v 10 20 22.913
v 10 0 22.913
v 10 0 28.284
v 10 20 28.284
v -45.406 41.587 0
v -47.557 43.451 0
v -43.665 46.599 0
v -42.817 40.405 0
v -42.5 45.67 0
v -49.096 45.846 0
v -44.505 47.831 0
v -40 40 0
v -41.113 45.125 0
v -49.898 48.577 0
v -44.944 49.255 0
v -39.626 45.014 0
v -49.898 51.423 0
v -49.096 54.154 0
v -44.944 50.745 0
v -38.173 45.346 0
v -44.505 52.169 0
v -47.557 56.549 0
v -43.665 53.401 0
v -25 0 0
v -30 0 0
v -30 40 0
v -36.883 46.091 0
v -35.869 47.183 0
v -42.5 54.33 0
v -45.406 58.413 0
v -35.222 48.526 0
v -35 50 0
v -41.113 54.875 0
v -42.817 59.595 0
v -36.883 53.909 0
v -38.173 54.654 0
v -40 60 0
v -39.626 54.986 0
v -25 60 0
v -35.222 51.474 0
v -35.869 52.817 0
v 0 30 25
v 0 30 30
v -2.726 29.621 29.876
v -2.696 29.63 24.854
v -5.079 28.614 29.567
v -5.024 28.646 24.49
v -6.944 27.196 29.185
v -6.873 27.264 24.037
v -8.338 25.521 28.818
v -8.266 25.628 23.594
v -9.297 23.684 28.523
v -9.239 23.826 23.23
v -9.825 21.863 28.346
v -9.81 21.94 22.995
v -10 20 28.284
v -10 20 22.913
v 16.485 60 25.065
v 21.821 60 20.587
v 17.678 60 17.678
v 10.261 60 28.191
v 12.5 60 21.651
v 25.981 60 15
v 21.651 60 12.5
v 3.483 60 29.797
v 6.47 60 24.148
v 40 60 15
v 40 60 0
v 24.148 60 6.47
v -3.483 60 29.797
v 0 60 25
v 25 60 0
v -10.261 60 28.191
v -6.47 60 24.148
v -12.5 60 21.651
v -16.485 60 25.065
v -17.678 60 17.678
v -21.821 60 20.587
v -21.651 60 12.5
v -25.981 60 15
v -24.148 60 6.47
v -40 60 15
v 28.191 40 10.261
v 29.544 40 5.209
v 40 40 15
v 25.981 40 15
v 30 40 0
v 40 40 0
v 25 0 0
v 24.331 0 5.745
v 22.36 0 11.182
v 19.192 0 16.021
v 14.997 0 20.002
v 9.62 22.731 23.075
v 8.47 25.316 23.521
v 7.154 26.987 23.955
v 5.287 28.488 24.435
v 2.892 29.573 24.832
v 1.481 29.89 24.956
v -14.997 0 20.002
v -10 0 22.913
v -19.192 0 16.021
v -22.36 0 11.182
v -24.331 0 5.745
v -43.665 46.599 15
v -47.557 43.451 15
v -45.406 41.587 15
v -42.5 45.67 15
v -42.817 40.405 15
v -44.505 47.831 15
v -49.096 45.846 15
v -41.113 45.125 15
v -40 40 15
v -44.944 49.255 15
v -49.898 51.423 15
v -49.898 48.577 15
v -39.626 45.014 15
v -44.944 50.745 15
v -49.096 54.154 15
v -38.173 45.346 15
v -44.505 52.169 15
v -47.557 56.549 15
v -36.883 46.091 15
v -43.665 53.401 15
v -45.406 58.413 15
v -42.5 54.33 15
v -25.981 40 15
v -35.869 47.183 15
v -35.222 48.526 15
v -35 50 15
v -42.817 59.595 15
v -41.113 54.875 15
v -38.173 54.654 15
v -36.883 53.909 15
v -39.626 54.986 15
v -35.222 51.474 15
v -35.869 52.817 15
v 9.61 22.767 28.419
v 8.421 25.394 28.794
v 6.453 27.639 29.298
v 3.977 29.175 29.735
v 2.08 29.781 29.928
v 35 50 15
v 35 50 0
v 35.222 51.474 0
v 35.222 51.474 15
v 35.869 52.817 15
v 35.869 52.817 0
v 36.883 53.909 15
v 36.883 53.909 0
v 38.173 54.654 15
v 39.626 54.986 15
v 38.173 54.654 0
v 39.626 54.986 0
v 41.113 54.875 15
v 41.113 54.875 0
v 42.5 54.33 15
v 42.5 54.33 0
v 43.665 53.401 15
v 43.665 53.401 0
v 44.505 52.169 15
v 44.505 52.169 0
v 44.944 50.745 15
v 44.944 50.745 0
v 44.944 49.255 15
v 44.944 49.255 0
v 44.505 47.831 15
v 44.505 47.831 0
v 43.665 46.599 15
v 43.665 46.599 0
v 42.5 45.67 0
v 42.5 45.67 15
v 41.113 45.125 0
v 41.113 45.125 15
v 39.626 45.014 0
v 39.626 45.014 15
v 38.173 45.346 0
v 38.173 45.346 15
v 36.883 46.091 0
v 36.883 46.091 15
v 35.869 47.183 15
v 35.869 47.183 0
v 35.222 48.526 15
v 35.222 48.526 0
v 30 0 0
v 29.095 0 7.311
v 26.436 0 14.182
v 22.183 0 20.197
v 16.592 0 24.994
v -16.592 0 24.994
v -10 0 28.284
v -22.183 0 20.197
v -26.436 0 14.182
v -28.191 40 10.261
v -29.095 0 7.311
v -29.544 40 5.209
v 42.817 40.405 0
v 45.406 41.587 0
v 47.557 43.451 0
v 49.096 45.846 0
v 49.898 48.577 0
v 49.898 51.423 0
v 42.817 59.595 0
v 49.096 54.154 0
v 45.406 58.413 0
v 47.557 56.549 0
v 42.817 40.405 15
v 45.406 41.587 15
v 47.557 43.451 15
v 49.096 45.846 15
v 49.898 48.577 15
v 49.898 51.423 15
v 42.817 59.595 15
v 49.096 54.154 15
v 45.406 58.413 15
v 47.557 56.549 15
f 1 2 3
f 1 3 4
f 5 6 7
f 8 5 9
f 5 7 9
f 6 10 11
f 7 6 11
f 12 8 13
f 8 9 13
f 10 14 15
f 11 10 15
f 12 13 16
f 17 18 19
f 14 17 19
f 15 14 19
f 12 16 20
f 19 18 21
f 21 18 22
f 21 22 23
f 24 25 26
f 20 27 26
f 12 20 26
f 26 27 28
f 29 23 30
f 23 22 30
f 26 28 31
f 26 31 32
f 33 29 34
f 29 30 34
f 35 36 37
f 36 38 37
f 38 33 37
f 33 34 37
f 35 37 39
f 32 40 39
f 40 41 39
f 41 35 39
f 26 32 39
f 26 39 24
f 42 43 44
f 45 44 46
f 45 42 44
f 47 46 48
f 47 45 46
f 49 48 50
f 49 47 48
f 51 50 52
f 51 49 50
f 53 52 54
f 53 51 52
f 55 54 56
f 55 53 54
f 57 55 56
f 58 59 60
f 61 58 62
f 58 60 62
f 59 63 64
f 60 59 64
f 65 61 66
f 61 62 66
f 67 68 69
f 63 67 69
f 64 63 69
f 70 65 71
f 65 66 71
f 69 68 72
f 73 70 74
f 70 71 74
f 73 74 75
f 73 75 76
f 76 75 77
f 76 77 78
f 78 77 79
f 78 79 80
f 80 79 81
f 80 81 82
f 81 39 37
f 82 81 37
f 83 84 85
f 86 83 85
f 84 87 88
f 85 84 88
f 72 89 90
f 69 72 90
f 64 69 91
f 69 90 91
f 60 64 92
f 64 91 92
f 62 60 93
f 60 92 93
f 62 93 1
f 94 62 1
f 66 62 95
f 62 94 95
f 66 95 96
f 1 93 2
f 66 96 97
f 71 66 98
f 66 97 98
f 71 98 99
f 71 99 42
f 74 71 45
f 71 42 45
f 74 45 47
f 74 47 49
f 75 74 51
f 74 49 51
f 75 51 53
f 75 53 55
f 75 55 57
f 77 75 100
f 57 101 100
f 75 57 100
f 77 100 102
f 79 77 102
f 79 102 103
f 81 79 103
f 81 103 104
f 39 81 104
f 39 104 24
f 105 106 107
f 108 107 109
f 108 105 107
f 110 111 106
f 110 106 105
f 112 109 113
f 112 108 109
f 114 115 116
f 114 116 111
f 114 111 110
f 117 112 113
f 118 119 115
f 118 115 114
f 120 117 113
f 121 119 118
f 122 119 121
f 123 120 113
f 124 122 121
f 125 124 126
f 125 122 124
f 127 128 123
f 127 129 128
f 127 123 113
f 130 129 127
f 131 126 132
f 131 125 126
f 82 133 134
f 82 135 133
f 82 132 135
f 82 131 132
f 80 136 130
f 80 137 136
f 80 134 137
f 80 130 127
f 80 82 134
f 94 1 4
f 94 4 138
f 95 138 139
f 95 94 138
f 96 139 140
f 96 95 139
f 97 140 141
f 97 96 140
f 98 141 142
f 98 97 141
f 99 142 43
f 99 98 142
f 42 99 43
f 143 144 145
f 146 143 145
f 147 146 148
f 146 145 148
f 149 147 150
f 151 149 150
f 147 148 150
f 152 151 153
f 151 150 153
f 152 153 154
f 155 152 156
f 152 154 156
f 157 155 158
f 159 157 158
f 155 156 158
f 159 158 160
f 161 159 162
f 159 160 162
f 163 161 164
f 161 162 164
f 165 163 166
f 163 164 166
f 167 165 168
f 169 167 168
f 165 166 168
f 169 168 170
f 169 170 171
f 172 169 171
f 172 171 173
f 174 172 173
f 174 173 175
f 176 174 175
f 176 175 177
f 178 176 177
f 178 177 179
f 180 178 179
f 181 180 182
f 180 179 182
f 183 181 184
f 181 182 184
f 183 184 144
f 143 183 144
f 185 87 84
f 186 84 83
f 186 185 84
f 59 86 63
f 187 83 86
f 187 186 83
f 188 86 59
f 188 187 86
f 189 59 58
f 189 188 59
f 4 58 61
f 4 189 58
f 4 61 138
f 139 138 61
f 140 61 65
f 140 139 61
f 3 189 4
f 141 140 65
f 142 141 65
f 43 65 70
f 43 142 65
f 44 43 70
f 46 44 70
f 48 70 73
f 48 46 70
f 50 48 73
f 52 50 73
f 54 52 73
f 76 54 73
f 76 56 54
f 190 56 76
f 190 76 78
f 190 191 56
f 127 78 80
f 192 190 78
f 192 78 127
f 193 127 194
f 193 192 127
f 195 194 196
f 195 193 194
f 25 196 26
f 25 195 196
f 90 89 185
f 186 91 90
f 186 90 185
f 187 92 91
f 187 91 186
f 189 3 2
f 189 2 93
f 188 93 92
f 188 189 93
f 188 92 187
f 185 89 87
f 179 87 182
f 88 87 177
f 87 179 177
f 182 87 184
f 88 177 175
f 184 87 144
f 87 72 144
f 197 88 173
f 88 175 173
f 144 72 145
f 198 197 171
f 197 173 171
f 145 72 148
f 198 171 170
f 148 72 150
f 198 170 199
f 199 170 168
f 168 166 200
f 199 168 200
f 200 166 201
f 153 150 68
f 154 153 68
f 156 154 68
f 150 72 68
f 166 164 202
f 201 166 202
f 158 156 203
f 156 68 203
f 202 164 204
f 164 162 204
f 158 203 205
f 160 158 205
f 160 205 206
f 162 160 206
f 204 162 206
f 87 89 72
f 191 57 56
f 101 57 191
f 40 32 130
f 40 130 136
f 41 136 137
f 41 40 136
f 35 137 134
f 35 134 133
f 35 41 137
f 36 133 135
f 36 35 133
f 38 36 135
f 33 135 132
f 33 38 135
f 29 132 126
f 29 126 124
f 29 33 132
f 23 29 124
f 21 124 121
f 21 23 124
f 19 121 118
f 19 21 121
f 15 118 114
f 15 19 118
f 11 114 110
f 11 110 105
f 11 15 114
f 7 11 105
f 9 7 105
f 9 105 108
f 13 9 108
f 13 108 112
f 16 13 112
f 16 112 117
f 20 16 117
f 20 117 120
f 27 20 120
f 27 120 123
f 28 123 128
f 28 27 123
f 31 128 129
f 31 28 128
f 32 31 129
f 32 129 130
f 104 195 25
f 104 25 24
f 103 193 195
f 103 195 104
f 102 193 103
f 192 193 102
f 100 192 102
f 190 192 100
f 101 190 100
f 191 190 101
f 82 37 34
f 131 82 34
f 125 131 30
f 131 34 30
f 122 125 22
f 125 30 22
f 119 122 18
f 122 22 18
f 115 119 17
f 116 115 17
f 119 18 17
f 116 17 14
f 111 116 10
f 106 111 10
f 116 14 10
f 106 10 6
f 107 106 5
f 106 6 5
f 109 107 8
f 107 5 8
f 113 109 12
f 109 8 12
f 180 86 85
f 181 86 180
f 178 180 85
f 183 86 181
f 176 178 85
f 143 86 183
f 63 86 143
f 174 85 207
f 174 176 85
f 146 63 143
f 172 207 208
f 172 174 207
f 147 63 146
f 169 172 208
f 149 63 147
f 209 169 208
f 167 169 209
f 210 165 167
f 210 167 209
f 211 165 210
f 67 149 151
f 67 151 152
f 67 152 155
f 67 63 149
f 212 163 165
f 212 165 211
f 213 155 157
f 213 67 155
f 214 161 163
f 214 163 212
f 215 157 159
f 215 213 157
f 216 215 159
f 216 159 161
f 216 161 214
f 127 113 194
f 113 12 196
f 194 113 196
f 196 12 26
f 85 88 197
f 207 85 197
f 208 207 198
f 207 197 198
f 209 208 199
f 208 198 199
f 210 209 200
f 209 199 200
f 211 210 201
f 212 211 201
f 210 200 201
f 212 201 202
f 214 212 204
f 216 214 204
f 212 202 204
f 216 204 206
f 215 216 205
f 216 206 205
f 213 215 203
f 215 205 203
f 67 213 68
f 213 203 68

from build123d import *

# Parameters (mm, degrees)
F1_DEPTH = 60
F3_DEPTH = 15
F4_R     = 5
F5_DEPTH = 15
F7_DEPTH = 30.0010001
F8_R     = 25
F9_DEPTH = 60.0010001


# Not quite as in the source:
# - a pattern or mirror of a feature is missing from the dataset's text; its kind, count and spacing are read off the source's solid


with BuildPart() as f1:
    # F0 (on Front) → F1 (new body)
    with BuildSketch(Plane.XZ):
        with BuildLine():
            Line((-30, 0), (30, 0))
            ThreePointArc((30, 0), (0, 30), (-30, 0))
        make_face()
    extrude(amount=-F1_DEPTH)

    # F2 (on Top) → F3 (join)
    with BuildSketch(Plane.XY):
        with BuildLine():
            ThreePointArc((-40, 60), (-50, 50), (-40, 40))
            Line((-40, 40), (40, 40))
            ThreePointArc((40, 40), (50, 50), (40, 60))
            Line((40, 60), (-40, 60))
        make_face()
    extrude(amount=F3_DEPTH)

    # F4 (on Top) → F5 (cut, through all)
    with BuildSketch(Plane.XY):
        with Locations((-40, 50)):
            Circle(F4_R)
    f5 = extrude(amount=F5_DEPTH, mode=Mode.SUBTRACT)

    # F5_copies: F5 across plane
    add(f5.mirror(Plane(origin=(0, 0, 0), x_dir=(0, 0, 1), z_dir=(1, 0, 0))), mode=Mode.SUBTRACT)

    # F6 (on Top) → F7 (cut, through all)
    with BuildSketch(Plane.XY):
        with BuildLine():
            Line((-10, 20), (-10, 0))
            Line((-10, 0), (0, 0))
            Line((0, 0), (0, 30))
            ThreePointArc((0, 30), (-7.0710678119, 27.0710678119), (-10, 20))
        make_face()
        with BuildLine():
            Line((0, 30), (0, 0))
            Line((0, 0), (10, 0))
            Line((10, 0), (10, 20))
            ThreePointArc((10, 20), (7.0710678119, 27.0710678119), (0, 30))
        make_face()
    extrude(amount=F7_DEPTH, mode=Mode.SUBTRACT)

    # F8 (on face) → F9 (cut, through all)
    with BuildSketch(Plane.XZ):
        Circle(F8_R)
    extrude(amount=-F9_DEPTH, mode=Mode.SUBTRACT)


solid = f1.part
